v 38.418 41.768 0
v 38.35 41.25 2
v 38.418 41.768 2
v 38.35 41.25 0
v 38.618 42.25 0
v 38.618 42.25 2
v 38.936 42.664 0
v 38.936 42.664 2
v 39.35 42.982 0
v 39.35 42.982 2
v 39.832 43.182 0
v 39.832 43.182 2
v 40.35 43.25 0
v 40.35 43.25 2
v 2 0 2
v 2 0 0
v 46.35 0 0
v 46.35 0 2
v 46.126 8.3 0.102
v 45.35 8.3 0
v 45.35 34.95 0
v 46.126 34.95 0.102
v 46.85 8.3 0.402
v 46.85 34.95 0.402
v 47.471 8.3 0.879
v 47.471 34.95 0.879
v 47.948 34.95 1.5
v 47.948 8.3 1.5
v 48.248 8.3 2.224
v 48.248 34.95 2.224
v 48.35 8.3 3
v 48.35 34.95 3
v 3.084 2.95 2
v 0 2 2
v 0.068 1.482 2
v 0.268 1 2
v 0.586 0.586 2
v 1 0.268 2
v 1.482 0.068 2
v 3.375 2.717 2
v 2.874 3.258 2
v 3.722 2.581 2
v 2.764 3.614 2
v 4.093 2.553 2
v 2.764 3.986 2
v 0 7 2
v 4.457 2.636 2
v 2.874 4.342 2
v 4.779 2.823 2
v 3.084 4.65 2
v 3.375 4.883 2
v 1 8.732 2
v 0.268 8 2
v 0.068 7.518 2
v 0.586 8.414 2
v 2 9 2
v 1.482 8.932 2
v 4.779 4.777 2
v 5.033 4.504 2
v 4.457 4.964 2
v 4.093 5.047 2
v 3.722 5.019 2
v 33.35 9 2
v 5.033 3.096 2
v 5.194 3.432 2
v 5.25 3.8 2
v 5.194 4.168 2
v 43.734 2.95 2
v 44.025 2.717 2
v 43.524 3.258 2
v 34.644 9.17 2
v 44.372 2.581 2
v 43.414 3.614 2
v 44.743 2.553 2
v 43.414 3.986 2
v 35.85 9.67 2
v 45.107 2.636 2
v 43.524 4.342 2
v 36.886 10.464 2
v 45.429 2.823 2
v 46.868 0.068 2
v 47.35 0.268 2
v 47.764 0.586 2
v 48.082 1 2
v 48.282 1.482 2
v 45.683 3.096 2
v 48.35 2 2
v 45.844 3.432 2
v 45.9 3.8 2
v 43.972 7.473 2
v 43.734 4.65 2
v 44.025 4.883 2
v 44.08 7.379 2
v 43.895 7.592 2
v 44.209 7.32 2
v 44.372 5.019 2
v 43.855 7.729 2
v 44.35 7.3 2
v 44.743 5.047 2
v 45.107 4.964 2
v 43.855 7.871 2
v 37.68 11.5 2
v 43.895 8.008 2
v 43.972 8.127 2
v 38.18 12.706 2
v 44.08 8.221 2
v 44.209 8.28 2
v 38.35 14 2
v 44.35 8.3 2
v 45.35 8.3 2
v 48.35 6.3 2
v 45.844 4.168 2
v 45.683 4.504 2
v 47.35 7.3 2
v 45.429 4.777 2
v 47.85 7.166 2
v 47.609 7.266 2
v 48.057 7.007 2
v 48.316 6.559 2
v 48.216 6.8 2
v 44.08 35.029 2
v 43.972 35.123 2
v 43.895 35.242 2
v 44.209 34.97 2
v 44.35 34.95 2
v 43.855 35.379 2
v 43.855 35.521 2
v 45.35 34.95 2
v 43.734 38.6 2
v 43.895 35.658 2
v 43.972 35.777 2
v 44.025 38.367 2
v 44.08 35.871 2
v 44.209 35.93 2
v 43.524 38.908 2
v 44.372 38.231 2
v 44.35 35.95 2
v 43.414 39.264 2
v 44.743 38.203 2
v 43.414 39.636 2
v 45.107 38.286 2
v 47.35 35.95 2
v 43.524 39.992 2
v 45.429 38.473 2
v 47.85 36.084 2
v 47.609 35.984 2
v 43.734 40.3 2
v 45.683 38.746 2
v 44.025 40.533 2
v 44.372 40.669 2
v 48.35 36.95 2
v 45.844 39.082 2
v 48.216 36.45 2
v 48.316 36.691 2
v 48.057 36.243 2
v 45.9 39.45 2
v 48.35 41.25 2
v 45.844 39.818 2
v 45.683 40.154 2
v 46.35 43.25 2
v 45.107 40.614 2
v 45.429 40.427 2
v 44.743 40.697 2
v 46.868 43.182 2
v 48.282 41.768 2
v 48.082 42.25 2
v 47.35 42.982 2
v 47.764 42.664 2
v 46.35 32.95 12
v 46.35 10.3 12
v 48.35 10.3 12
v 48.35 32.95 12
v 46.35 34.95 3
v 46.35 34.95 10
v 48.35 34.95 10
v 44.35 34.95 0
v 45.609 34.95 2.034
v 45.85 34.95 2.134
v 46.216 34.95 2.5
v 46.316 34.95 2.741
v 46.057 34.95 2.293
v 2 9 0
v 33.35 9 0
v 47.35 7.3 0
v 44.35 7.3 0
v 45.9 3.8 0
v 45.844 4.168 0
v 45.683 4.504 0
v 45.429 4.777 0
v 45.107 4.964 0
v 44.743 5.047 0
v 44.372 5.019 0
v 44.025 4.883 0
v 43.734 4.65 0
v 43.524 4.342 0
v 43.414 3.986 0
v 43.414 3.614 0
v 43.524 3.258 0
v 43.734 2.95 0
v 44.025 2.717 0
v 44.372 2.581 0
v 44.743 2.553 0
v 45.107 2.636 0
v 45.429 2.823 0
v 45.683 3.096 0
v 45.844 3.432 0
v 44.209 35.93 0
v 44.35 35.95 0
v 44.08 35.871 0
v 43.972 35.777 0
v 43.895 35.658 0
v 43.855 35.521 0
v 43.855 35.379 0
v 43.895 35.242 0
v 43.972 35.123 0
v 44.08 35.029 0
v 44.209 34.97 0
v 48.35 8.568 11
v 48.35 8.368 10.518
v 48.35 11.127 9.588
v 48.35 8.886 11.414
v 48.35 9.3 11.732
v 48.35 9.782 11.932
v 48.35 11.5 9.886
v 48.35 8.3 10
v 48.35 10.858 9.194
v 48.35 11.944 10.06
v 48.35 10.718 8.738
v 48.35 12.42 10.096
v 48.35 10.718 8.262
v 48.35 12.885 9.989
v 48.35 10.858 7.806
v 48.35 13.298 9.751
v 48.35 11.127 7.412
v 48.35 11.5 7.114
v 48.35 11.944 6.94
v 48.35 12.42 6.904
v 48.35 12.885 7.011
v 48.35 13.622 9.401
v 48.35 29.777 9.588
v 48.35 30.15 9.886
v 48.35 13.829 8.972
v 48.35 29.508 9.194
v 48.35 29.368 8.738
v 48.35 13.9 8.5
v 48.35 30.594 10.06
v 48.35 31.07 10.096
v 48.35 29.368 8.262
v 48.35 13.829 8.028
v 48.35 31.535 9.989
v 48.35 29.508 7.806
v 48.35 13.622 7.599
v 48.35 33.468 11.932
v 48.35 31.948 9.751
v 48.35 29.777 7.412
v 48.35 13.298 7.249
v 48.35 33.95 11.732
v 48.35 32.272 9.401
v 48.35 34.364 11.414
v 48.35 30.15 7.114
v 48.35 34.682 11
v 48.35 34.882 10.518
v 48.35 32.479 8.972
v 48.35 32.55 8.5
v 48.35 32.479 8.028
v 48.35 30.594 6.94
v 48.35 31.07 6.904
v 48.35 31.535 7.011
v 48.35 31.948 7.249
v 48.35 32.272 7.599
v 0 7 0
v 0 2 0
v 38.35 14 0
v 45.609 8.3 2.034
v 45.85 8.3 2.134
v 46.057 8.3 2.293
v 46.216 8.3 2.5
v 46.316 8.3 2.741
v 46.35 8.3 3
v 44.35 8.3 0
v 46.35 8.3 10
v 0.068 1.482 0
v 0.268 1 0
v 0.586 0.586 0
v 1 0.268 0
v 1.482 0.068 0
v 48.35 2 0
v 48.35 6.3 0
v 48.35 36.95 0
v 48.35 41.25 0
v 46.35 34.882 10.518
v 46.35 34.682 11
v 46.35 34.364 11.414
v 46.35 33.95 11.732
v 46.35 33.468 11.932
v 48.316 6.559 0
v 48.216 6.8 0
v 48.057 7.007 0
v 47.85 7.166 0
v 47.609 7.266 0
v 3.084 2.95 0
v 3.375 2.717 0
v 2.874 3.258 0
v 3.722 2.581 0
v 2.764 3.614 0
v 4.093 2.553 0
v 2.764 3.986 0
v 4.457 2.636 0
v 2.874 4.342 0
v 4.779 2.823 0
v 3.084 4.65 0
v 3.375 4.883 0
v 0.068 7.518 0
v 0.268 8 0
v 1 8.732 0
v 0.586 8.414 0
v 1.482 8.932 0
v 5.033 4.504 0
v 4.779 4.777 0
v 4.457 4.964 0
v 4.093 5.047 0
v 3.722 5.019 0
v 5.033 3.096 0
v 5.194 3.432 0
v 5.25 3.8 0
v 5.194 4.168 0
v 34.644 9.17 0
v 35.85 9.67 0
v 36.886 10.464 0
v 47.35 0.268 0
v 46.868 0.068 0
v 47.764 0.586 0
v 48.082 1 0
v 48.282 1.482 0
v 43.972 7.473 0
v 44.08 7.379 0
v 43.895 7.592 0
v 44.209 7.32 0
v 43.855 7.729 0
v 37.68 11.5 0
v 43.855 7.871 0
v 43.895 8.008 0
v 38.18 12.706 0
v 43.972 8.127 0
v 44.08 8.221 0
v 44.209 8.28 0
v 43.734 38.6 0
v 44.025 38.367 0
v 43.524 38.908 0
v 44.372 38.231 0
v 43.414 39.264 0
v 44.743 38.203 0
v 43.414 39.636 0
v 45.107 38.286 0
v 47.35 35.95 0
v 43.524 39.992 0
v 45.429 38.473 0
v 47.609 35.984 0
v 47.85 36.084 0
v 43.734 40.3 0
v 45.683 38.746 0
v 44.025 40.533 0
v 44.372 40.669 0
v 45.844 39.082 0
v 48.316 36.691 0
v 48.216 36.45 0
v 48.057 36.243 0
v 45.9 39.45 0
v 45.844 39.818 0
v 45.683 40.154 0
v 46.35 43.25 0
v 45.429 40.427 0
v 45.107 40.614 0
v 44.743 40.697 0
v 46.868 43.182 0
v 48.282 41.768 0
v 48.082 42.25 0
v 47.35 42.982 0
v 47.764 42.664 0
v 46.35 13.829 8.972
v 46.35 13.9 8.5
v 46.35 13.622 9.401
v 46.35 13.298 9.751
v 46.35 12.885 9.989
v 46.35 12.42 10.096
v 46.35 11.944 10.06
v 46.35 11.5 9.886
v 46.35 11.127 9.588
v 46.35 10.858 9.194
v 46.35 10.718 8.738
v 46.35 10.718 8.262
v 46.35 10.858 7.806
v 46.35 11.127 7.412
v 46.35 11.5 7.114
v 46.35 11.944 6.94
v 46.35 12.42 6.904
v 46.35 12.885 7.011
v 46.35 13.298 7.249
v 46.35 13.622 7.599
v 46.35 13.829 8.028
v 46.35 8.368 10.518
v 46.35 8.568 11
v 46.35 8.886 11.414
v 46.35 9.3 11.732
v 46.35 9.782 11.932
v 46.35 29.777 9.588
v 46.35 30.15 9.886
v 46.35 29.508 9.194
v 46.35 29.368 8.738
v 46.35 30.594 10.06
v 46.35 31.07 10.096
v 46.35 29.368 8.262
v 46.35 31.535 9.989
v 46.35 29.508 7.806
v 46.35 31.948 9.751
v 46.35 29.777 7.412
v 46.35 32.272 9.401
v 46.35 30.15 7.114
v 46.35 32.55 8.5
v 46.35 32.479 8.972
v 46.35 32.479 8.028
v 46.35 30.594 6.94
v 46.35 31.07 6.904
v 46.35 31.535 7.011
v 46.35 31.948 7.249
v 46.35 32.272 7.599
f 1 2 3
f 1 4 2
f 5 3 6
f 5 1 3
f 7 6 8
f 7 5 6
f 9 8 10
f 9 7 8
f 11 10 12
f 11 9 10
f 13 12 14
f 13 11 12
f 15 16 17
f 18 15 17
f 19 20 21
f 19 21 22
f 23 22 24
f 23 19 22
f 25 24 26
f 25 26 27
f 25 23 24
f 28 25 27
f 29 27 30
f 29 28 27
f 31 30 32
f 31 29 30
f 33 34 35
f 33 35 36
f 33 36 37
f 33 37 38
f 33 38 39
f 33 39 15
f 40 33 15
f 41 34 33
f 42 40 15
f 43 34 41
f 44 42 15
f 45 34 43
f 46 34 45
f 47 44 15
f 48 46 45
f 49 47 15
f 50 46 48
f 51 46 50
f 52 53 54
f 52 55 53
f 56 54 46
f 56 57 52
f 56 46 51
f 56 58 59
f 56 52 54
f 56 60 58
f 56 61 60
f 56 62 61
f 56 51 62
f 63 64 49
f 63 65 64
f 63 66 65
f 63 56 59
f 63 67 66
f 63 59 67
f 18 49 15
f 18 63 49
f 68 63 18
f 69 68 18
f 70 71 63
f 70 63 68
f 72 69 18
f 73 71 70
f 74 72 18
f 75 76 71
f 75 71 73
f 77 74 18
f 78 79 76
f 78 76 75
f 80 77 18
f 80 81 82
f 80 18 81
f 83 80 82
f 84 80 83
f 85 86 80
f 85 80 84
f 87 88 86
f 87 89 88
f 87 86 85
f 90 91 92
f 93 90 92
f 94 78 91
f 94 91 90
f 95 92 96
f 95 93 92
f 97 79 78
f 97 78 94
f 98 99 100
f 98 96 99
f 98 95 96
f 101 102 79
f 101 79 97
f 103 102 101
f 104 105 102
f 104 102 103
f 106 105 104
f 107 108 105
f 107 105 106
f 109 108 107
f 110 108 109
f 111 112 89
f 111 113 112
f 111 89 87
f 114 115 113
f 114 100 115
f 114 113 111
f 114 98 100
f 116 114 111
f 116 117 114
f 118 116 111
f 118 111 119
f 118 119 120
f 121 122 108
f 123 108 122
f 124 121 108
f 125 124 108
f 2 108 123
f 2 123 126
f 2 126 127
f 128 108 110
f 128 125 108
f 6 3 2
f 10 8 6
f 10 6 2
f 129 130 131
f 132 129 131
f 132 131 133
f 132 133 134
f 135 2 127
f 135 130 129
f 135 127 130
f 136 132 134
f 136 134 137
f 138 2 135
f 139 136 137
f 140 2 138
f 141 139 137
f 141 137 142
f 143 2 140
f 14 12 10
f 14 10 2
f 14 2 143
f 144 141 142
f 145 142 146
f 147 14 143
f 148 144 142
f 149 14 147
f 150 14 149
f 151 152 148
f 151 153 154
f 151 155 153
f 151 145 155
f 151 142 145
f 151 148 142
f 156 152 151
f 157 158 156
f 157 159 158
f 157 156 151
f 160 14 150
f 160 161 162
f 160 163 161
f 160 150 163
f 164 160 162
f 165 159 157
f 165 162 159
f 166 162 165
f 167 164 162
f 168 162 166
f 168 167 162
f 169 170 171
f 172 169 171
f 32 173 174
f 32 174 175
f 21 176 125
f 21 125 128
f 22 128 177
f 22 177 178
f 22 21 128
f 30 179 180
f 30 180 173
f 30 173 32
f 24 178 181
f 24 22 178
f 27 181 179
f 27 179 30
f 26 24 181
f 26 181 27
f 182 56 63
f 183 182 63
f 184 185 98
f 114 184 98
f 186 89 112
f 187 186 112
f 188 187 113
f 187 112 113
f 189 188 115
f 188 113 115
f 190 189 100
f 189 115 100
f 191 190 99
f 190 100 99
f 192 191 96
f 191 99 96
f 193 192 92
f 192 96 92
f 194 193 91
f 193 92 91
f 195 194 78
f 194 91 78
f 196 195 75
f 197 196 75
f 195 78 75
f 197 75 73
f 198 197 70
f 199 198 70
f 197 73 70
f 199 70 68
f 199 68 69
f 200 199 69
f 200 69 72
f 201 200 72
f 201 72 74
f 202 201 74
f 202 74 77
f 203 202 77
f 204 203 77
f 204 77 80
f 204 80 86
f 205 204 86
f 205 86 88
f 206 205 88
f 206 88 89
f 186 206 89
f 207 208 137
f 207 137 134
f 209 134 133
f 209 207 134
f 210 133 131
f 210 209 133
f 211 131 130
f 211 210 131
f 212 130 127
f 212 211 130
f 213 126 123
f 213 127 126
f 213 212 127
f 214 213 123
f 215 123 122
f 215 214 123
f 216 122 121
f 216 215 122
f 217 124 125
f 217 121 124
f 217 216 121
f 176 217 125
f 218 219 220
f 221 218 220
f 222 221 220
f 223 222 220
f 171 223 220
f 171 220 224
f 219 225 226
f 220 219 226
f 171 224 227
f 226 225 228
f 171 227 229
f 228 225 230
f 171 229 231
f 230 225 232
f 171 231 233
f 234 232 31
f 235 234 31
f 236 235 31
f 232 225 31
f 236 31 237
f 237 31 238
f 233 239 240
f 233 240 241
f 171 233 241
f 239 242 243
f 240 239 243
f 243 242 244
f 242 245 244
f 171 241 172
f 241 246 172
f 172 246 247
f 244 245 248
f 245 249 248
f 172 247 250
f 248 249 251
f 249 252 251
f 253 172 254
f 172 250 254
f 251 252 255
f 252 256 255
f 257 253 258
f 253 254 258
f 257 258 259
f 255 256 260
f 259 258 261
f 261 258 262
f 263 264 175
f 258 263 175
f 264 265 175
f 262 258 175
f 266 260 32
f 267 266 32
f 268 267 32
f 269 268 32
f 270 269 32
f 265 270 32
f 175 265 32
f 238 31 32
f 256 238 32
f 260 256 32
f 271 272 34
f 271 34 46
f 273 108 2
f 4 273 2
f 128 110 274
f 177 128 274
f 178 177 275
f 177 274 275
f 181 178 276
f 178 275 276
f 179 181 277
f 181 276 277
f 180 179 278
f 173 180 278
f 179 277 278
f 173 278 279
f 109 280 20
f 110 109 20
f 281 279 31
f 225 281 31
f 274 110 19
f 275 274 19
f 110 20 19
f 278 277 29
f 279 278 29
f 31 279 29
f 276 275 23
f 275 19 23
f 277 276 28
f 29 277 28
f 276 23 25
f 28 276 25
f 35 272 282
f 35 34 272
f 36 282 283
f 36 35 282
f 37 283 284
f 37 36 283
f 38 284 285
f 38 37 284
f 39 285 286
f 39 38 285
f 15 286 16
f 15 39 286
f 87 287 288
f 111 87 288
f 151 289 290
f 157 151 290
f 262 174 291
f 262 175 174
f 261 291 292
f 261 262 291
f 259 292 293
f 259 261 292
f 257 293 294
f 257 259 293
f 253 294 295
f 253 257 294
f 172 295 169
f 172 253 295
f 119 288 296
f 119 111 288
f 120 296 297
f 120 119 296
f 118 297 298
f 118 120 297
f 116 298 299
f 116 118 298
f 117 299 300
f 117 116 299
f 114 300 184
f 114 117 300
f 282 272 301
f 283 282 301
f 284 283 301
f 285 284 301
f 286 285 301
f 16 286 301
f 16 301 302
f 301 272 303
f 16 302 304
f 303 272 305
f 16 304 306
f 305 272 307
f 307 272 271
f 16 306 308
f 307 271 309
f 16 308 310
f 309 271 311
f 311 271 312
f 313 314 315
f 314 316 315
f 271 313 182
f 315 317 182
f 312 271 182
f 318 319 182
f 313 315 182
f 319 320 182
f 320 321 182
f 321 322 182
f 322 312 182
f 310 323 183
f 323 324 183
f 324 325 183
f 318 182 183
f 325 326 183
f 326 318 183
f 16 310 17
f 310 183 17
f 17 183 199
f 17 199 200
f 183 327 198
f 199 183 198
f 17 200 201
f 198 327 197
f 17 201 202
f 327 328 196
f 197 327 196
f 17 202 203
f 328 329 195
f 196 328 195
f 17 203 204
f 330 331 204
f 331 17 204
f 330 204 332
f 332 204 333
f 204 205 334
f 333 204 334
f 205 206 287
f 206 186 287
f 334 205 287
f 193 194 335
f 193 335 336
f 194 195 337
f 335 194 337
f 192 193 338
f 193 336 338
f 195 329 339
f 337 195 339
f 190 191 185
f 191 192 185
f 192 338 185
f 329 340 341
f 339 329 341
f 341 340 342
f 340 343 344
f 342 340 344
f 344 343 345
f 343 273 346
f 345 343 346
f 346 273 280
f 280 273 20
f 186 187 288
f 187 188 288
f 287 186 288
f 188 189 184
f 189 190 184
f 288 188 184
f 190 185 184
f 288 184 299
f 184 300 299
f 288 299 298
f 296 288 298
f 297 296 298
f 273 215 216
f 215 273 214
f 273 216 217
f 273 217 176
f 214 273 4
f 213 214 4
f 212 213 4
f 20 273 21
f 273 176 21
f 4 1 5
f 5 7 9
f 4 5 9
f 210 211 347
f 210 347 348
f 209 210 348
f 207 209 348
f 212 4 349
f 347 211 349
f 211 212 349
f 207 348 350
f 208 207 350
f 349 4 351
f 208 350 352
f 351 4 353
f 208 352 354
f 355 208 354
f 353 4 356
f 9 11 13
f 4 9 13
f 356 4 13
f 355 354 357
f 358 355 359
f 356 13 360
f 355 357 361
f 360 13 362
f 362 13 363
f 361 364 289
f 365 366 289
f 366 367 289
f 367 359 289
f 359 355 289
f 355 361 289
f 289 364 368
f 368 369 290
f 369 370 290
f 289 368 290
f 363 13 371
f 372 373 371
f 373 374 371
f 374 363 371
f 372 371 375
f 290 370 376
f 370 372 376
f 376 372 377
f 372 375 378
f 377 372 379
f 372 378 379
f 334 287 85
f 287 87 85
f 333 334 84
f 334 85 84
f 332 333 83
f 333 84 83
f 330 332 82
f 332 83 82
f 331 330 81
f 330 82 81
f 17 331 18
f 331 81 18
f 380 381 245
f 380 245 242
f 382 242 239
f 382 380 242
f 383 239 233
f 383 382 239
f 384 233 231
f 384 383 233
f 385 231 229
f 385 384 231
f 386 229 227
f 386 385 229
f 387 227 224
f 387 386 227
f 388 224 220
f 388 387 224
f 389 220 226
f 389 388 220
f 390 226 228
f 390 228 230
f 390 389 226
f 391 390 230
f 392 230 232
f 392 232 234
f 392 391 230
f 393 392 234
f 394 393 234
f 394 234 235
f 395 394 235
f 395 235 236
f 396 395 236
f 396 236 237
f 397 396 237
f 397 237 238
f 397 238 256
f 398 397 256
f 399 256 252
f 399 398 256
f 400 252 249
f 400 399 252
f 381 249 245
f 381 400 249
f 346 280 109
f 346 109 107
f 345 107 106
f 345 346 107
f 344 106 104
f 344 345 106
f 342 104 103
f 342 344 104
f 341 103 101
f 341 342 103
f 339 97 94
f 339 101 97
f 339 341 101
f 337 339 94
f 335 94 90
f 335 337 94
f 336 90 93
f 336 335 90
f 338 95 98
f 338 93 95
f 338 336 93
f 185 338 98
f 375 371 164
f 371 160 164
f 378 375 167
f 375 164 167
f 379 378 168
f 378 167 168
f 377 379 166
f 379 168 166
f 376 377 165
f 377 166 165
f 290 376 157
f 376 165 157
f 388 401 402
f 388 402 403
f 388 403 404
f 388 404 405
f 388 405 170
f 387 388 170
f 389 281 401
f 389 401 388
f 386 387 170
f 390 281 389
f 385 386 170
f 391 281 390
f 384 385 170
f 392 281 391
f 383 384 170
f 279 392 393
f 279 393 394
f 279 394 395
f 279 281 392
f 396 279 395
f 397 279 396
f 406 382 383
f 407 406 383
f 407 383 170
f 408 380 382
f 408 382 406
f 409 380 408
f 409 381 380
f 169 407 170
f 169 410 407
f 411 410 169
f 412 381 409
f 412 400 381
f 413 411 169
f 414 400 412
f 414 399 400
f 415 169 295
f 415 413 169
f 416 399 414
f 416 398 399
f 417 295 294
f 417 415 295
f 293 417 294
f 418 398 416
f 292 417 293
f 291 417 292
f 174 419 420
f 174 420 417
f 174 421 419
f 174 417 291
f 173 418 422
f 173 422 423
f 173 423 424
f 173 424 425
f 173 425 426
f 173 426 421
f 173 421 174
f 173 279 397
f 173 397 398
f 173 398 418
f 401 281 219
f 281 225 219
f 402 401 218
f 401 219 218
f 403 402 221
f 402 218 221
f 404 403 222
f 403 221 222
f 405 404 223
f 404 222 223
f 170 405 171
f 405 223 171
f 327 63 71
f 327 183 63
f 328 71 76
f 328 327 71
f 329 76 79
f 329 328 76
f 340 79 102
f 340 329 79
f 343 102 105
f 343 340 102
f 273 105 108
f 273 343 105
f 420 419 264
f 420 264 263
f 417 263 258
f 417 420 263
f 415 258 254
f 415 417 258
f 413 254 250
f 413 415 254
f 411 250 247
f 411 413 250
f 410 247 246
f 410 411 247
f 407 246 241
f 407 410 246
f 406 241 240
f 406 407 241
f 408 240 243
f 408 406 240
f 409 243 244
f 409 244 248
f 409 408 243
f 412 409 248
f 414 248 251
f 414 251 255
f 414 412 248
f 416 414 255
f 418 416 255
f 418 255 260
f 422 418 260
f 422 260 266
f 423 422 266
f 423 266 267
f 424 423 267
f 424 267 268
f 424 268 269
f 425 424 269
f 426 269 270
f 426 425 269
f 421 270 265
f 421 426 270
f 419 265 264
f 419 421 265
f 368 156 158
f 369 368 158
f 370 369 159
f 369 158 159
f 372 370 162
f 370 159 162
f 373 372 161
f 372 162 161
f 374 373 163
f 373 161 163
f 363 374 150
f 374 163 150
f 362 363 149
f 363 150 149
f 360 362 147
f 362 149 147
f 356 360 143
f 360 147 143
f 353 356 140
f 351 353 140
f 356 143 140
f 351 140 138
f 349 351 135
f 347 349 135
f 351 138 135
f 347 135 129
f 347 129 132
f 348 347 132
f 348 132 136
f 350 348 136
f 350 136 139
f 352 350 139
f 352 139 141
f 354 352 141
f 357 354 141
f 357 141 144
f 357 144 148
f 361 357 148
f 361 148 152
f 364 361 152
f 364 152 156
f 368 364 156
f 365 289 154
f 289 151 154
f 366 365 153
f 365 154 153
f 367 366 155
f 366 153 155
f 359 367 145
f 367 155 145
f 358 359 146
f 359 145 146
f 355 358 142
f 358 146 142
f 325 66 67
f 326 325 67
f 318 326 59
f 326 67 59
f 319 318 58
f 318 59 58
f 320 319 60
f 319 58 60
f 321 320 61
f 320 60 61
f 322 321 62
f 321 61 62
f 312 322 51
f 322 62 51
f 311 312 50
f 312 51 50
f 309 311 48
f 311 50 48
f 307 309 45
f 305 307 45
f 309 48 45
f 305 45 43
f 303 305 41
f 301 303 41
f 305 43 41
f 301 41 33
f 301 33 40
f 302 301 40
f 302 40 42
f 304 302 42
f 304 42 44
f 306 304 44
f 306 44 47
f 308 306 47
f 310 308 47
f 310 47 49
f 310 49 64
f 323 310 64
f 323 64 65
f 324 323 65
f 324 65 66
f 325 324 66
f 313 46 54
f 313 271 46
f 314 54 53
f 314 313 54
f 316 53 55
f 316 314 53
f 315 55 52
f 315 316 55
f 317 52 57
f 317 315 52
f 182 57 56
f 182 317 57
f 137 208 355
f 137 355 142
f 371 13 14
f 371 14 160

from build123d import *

# Parameters (mm, degrees)
SKETCH1_W                 = 48.35
SKETCH1_H                 = 43.25
BOSS_EXTRUDE2_DEPTH       = 2
EDGE_FLANGE1_START        = -4
EDGE_FLANGE1_OUTLINE_W    = 1
EDGE_FLANGE1_OUTLINE_H    = 2
EDGE_FLANGE1_DEPTH        = 4
EDGE_FLANGE1_START_2      = -1
EDGE_FLANGE1_2_DEPTH      = 3.09178
EDGE_FLANGE1_START_3      = 2
EDGE_FLANGE1_3_OUTLINE_W  = 2
EDGE_FLANGE1_3_OUTLINE_H  = 26.65
EDGE_FLANGE1_3_DEPTH      = 10
EDGE_FLANGE1_START_4      = 8.3
EDGE_FLANGE1_4_DEPTH      = 26.65
EDGE_FLANGE1_5_DEPTH      = 26.65
EDGE_FLANGE1_START_5      = 46.35
EDGE_FLANGE1_6_OUTLINE_R  = 1.6
EDGE_FLANGE1_6_DEPTH      = 2
REDONDEO1_R               = 2
TALADRO_ROSCADO_M31_D     = 2.5
TALADRO_ROSCADO_M31_DEPTH = 8.5
TALADRO_ROSCADO_M31_TIP   = 0.751075774
CROQUIS4_W                = 38.35
CROQUIS4_H                = 34.25
CORTAR_EXTRUIR1_DEPTH     = 66.637527376
FILLET1_R                 = 2
REDONDEO2_R               = 5
REDONDEO3_R               = 1


with BuildPart() as part:
    # Sketch1 → Boss-Extrude2 (new body)
    with BuildSketch(Plane.XY):
        with Locations((24.175, 21.625)):
            Rectangle(SKETCH1_W, SKETCH1_H)
    extrude(amount=BOSS_EXTRUDE2_DEPTH)

    # Edge-Flange1: read off the stored shape, not the designer's step
    # Edge-Flange1 outline → Edge-Flange1 (cut)
    with BuildSketch(Plane(origin=(48.35, 0, 2), x_dir=(0, 1, 0), z_dir=(1, 0, 0)).offset(EDGE_FLANGE1_START)):
        with Locations((35.45, -1)):
            Rectangle(EDGE_FLANGE1_OUTLINE_W, EDGE_FLANGE1_OUTLINE_H)
        with Locations((7.8, -1)):
            Rectangle(EDGE_FLANGE1_OUTLINE_W, EDGE_FLANGE1_OUTLINE_H)
    extrude(amount=EDGE_FLANGE1_DEPTH, mode=Mode.SUBTRACT)

    # Edge-Flange1 2 outline → Edge-Flange1 2 (cut)
    with BuildSketch(Plane.XY.offset(EDGE_FLANGE1_START_2)):
        with BuildLine():
            Line((44.35, 7.3), (44.35, 8.3))
            ThreePointArc((44.35, 8.3), (43.85, 7.8), (44.35, 7.3))
        make_face()
        with BuildLine():
            ThreePointArc((44.35, 35.95), (43.85, 35.45), (44.35, 34.95))
            Line((44.35, 34.95), (44.35, 35.95))
        make_face()
    extrude(amount=EDGE_FLANGE1_2_DEPTH, mode=Mode.SUBTRACT)

    # Edge-Flange1 3 outline → Edge-Flange1 3 (add)
    with BuildSketch(Plane.XY.offset(EDGE_FLANGE1_START_3)):
        with Locations((47.35, 21.625)):
            Rectangle(EDGE_FLANGE1_3_OUTLINE_W, EDGE_FLANGE1_3_OUTLINE_H)
    extrude(amount=EDGE_FLANGE1_3_DEPTH)

    # Edge-Flange1 4 outline → Edge-Flange1 4 (add)
    with BuildSketch(Plane(origin=(0, 0, 0), x_dir=(1, 0, 0), z_dir=(0, 1, 0)).offset(EDGE_FLANGE1_START_4)):
        with BuildLine():
            Line((46.35, -3), (46.35, -2))
            Line((46.35, -2), (45.35, -2))
            ThreePointArc((45.35, -2), (46.057106781, -2.292893219), (46.35, -3))
        make_face()
    extrude(amount=EDGE_FLANGE1_4_DEPTH)

    # Edge-Flange1 5 outline → Edge-Flange1 5 (cut)
    with BuildSketch(Plane(origin=(0, 0, 0), x_dir=(1, 0, 0), z_dir=(0, 1, 0)).offset(EDGE_FLANGE1_START_4)):
        with BuildLine():
            Line((48.35, -3), (48.35, 0))
            Line((48.35, 0), (45.35, 0))
            ThreePointArc((45.35, 0), (47.471320344, -0.878679656), (48.35, -3))
        make_face()
    extrude(amount=EDGE_FLANGE1_5_DEPTH, mode=Mode.SUBTRACT)

    # Edge-Flange1 6 outline → Edge-Flange1 6 (cut)
    with BuildSketch(Plane.YZ.offset(EDGE_FLANGE1_START_5)):
        with Locations((12.3, 8.5)):
            Circle(EDGE_FLANGE1_6_OUTLINE_R)
        with Locations((30.95, 8.5)):
            Circle(EDGE_FLANGE1_6_OUTLINE_R)
    extrude(amount=EDGE_FLANGE1_6_DEPTH, mode=Mode.SUBTRACT)

    # Redondeo1
    redondeo1_edges = [part.edges().sort_by_distance(p)[0] for p in [
        (47.35, 8.3, 12),
        (47.35, 34.95, 12),
    ]]
    fillet(redondeo1_edges, radius=REDONDEO1_R)

    # Taladro roscado M31
    with Locations(Plane(origin=(0, 0, 0), x_dir=(-1, 0, 0), z_dir=(0, 0, -1))):
        with Locations((-44.65, 39.45), (-4, 3.8), (-44.65, 3.8)):
            Hole(TALADRO_ROSCADO_M31_D / 2, depth=TALADRO_ROSCADO_M31_DEPTH)
            with Locations((0, 0, -(TALADRO_ROSCADO_M31_DEPTH + TALADRO_ROSCADO_M31_TIP / 2))):  # 118° drill point
                Cone(0, TALADRO_ROSCADO_M31_D / 2, TALADRO_ROSCADO_M31_TIP, mode=Mode.SUBTRACT)

    # Croquis4 → Cortar-Extruir1 (cut, through all)
    with BuildSketch(Plane.XY.offset(2)):
        with Locations((19.175, 26.125)):
            Rectangle(CROQUIS4_W, CROQUIS4_H)
    extrude(amount=-CORTAR_EXTRUIR1_DEPTH, mode=Mode.SUBTRACT)

    # Fillet1
    fillet1_edges = [part.edges().sort_by_distance(p)[0] for p in [
        (0, 9, 1),
        (38.35, 43.25, 1),
        (0, 0, 1),
        (48.35, 43.25, 1),
        (48.35, 0, 1),
    ]]
    fillet(fillet1_edges, radius=FILLET1_R)

    # Redondeo2
    redondeo2_edges = [part.edges().sort_by_distance(p)[0] for p in [
        (38.35, 9, 1),
    ]]
    fillet(redondeo2_edges, radius=REDONDEO2_R)

    # Redondeo3
    redondeo3_edges = [part.edges().sort_by_distance(p)[0] for p in [
        (48.35, 35.95, 1),
        (48.35, 7.3, 1),
    ]]
    fillet(redondeo3_edges, radius=REDONDEO3_R)


solid = part.part
